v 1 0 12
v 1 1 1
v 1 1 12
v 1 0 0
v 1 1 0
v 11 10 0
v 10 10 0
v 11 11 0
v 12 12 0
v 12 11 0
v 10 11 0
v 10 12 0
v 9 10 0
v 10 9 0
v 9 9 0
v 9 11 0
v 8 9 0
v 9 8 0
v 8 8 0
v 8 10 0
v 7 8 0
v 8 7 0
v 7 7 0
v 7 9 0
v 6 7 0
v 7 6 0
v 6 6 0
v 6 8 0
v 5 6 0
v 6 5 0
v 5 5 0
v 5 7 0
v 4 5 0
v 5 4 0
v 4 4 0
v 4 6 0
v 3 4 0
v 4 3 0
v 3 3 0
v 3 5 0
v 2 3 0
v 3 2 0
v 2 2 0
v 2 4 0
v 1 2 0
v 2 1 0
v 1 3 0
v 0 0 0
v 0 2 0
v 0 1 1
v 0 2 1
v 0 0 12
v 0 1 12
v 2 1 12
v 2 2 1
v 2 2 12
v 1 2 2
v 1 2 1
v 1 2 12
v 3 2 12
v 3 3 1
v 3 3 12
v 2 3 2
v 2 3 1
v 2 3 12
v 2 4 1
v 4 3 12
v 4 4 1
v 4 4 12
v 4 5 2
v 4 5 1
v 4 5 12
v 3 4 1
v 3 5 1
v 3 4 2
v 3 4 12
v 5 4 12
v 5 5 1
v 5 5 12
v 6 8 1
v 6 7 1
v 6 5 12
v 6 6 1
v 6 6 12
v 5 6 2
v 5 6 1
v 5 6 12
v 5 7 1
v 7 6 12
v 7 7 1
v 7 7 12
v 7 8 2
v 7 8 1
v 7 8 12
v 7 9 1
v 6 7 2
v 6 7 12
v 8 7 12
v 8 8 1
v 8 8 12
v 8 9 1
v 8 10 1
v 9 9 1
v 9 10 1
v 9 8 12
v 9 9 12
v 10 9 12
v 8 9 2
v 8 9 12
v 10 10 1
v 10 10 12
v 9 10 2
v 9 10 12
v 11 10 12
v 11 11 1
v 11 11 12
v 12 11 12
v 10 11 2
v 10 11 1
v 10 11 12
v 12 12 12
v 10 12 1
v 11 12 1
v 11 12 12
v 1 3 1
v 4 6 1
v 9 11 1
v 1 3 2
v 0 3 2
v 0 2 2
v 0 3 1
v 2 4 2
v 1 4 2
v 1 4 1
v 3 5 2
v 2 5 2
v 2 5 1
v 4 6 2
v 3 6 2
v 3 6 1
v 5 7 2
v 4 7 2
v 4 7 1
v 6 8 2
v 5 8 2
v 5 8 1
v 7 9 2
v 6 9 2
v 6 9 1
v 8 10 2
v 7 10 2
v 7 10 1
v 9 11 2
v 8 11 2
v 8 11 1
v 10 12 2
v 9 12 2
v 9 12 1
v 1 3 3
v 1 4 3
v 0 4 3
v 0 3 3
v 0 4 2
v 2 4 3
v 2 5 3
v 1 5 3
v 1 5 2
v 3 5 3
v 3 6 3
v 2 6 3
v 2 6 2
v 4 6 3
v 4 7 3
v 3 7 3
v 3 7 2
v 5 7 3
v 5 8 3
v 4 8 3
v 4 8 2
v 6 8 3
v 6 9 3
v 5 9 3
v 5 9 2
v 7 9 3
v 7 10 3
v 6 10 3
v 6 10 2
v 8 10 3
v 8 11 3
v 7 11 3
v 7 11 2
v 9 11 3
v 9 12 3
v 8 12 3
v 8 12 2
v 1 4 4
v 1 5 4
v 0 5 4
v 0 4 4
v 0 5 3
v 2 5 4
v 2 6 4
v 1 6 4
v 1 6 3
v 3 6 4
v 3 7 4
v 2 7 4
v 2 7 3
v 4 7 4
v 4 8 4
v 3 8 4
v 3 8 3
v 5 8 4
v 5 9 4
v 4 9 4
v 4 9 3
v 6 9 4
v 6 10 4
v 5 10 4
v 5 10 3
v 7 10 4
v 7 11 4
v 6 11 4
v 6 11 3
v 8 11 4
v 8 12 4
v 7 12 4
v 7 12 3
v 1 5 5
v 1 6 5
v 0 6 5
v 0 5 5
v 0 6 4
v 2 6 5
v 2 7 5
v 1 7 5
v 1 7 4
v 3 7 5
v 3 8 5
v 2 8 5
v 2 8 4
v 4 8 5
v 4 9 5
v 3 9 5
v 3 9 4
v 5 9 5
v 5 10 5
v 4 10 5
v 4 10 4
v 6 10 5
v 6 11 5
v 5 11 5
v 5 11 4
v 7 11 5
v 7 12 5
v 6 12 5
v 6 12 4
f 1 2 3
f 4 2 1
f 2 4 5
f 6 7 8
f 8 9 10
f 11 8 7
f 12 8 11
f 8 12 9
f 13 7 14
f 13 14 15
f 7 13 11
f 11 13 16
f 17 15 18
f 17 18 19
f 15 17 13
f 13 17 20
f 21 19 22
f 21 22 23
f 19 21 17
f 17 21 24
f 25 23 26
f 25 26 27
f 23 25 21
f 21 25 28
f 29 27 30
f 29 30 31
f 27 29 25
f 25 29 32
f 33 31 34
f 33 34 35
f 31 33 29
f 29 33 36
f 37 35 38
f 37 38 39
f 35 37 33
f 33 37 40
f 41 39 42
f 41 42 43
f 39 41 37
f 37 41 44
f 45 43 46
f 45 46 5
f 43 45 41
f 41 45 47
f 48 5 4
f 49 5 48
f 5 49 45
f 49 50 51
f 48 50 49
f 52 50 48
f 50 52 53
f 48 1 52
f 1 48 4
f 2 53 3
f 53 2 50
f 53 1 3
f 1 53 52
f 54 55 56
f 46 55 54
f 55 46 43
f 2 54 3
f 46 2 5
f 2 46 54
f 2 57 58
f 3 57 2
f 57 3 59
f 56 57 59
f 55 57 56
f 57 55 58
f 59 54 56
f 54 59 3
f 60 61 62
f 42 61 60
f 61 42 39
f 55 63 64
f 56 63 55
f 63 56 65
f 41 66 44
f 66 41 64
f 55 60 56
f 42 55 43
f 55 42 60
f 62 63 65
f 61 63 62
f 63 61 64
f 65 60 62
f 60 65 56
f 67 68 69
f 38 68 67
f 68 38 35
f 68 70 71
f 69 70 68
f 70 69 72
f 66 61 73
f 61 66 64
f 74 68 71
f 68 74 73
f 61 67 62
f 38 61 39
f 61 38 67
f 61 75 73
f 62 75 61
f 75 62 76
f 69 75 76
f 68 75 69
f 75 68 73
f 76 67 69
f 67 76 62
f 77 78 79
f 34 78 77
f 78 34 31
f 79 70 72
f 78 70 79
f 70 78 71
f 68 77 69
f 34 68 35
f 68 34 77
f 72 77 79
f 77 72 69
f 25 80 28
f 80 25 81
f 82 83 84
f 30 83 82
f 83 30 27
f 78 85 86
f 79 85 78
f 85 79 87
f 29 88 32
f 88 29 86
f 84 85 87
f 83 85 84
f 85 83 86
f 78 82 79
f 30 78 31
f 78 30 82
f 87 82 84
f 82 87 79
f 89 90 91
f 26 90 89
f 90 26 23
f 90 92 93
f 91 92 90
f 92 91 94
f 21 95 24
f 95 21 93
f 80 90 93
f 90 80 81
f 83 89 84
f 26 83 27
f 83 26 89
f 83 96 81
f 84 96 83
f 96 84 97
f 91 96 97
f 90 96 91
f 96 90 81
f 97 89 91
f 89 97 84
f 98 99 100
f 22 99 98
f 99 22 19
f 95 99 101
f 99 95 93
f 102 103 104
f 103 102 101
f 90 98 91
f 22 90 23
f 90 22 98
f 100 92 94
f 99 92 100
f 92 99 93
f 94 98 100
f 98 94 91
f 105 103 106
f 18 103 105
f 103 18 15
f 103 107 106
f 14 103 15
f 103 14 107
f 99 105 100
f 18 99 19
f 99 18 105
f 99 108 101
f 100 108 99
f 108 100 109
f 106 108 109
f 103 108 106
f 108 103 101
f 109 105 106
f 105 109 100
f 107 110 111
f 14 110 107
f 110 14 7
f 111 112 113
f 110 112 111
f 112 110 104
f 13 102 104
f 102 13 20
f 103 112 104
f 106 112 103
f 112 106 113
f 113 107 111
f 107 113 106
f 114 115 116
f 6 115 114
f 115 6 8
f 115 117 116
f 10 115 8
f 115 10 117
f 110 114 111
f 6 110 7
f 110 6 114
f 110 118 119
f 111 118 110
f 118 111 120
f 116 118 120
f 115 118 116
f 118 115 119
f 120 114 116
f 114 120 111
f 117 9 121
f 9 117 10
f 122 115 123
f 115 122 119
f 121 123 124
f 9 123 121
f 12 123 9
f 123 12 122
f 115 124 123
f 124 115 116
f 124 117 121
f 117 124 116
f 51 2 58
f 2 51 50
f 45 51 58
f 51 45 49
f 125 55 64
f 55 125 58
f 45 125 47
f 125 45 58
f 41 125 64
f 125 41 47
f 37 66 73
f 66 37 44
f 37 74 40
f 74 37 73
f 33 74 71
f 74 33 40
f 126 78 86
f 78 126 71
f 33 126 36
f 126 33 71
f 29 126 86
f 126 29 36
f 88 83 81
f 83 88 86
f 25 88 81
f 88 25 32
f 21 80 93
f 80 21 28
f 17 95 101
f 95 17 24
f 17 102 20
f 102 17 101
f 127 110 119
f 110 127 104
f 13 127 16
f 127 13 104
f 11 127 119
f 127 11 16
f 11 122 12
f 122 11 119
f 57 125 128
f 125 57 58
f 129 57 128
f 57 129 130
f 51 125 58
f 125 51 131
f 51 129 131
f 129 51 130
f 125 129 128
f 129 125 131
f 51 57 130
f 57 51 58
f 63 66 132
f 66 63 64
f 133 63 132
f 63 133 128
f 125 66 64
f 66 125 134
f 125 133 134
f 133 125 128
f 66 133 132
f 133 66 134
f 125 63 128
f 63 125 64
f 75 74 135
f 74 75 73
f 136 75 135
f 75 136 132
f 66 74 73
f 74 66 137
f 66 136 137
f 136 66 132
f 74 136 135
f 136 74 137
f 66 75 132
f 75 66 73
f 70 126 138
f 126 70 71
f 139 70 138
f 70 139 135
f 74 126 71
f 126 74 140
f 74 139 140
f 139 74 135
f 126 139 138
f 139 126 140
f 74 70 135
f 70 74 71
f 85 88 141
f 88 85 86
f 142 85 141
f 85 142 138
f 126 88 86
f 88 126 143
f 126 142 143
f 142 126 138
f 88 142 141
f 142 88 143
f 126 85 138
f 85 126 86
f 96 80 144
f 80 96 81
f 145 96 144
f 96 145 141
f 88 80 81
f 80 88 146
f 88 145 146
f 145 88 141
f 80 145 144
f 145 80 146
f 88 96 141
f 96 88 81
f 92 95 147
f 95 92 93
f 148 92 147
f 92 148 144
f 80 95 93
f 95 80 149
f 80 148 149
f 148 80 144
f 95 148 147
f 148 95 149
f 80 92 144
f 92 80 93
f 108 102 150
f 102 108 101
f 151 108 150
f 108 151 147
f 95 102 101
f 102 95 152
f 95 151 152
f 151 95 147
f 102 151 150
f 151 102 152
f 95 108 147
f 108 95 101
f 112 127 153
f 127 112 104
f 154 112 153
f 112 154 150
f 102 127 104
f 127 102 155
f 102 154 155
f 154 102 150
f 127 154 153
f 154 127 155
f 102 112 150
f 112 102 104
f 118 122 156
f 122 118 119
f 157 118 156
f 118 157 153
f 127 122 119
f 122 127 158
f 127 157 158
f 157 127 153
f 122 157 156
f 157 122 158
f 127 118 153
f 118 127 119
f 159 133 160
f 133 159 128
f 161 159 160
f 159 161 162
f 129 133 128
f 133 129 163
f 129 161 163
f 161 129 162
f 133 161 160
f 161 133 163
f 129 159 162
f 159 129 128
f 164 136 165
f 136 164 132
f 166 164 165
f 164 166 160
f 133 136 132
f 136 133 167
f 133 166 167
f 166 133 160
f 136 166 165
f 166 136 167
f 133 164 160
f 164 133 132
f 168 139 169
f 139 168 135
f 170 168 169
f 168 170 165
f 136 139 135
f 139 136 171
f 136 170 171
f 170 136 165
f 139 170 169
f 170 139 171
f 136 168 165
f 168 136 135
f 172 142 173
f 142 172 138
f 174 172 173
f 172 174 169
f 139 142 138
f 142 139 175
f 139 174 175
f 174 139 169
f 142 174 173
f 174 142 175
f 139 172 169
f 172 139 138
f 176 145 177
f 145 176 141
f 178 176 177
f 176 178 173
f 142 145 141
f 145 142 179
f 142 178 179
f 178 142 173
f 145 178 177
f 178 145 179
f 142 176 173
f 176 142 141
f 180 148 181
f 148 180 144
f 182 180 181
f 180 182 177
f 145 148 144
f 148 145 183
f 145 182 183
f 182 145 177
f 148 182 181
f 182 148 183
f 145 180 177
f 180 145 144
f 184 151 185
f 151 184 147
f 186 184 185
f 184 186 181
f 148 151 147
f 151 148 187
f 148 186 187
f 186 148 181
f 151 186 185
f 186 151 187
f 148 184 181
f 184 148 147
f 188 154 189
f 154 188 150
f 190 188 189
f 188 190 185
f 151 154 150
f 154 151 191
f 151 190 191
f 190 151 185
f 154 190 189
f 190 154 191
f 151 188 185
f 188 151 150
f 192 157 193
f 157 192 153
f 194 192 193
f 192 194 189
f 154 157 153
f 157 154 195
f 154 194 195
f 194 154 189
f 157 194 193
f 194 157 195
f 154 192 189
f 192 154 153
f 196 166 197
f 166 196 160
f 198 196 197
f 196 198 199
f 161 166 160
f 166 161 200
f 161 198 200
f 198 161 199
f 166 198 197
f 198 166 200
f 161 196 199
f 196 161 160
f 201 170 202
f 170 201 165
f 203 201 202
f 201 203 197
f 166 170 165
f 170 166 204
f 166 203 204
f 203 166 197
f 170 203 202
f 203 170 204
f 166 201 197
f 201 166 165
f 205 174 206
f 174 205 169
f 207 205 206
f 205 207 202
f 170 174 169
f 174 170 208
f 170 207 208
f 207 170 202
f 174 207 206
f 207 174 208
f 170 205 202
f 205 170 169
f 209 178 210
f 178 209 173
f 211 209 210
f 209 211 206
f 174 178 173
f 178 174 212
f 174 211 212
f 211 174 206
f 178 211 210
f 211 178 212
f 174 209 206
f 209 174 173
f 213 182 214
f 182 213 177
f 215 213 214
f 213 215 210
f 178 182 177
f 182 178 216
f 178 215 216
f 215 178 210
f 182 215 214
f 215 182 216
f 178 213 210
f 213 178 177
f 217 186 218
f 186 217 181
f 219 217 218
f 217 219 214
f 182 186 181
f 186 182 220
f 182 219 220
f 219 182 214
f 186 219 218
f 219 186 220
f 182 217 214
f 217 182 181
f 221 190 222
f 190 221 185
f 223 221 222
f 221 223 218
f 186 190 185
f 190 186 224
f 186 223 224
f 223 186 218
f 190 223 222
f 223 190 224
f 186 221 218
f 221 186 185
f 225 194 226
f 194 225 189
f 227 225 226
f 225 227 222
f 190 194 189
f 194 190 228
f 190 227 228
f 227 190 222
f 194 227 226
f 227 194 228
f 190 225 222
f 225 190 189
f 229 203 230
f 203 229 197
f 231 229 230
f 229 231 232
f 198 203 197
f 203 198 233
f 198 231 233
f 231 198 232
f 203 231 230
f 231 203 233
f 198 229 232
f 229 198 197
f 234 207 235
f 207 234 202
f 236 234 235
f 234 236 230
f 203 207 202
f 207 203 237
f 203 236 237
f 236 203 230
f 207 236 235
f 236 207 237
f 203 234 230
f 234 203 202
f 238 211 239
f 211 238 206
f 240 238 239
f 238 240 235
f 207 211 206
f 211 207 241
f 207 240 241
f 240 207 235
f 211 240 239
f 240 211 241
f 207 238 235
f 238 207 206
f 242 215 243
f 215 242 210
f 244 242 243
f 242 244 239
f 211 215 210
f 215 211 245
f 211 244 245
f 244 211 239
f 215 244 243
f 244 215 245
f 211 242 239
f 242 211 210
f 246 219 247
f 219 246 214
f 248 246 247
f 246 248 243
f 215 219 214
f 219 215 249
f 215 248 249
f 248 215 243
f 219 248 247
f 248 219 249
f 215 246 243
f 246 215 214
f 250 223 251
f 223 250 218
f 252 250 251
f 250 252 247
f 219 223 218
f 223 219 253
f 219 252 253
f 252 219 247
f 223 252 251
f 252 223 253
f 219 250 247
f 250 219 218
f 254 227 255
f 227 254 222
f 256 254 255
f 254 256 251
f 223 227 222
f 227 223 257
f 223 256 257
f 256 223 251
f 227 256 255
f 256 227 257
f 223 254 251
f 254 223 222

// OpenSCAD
union() {
    translate([0, 0, 0]) cube([1, 1, 1]);
    translate([0, 0, 1]) cube([1, 1, 1]);
    translate([0, 0, 2]) cube([1, 1, 1]);
    translate([0, 0, 3]) cube([1, 1, 1]);
    translate([0, 0, 4]) cube([1, 1, 1]);
    translate([0, 0, 5]) cube([1, 1, 1]);
    translate([0, 0, 6]) cube([1, 1, 1]);
    translate([0, 0, 7]) cube([1, 1, 1]);
    translate([0, 0, 8]) cube([1, 1, 1]);
    translate([0, 0, 9]) cube([1, 1, 1]);
    translate([0, 0, 10]) cube([1, 1, 1]);
    translate([0, 0, 11]) cube([1, 1, 1]);
    translate([1, 1, 0]) cube([1, 1, 1]);
    translate([1, 1, 1]) cube([1, 1, 1]);
    translate([1, 1, 2]) cube([1, 1, 1]);
    translate([1, 1, 3]) cube([1, 1, 1]);
    translate([1, 1, 4]) cube([1, 1, 1]);
    translate([1, 1, 5]) cube([1, 1, 1]);
    translate([1, 1, 6]) cube([1, 1, 1]);
    translate([1, 1, 7]) cube([1, 1, 1]);
    translate([1, 1, 8]) cube([1, 1, 1]);
    translate([1, 1, 9]) cube([1, 1, 1]);
    translate([1, 1, 10]) cube([1, 1, 1]);
    translate([1, 1, 11]) cube([1, 1, 1]);
    translate([2, 2, 0]) cube([1, 1, 1]);
    translate([2, 2, 1]) cube([1, 1, 1]);
    translate([2, 2, 2]) cube([1, 1, 1]);
    translate([2, 2, 3]) cube([1, 1, 1]);
    translate([2, 2, 4]) cube([1, 1, 1]);
    translate([2, 2, 5]) cube([1, 1, 1]);
    translate([2, 2, 6]) cube([1, 1, 1]);
    translate([2, 2, 7]) cube([1, 1, 1]);
    translate([2, 2, 8]) cube([1, 1, 1]);
    translate([2, 2, 9]) cube([1, 1, 1]);
    translate([2, 2, 10]) cube([1, 1, 1]);
    translate([2, 2, 11]) cube([1, 1, 1]);
    translate([3, 3, 0]) cube([1, 1, 1]);
    translate([3, 3, 1]) cube([1, 1, 1]);
    translate([3, 3, 2]) cube([1, 1, 1]);
    translate([3, 3, 3]) cube([1, 1, 1]);
    translate([3, 3, 4]) cube([1, 1, 1]);
    translate([3, 3, 5]) cube([1, 1, 1]);
    translate([3, 3, 6]) cube([1, 1, 1]);
    translate([3, 3, 7]) cube([1, 1, 1]);
    translate([3, 3, 8]) cube([1, 1, 1]);
    translate([3, 3, 9]) cube([1, 1, 1]);
    translate([3, 3, 10]) cube([1, 1, 1]);
    translate([3, 3, 11]) cube([1, 1, 1]);
    translate([4, 4, 0]) cube([1, 1, 1]);
    translate([4, 4, 1]) cube([1, 1, 1]);
    translate([4, 4, 2]) cube([1, 1, 1]);
    translate([4, 4, 3]) cube([1, 1, 1]);
    translate([4, 4, 4]) cube([1, 1, 1]);
    translate([4, 4, 5]) cube([1, 1, 1]);
    translate([4, 4, 6]) cube([1, 1, 1]);
    translate([4, 4, 7]) cube([1, 1, 1]);
    translate([4, 4, 8]) cube([1, 1, 1]);
    translate([4, 4, 9]) cube([1, 1, 1]);
    translate([4, 4, 10]) cube([1, 1, 1]);
    translate([4, 4, 11]) cube([1, 1, 1]);
    translate([5, 5, 0]) cube([1, 1, 1]);
    translate([5, 5, 1]) cube([1, 1, 1]);
    translate([5, 5, 2]) cube([1, 1, 1]);
    translate([5, 5, 3]) cube([1, 1, 1]);
    translate([5, 5, 4]) cube([1, 1, 1]);
    translate([5, 5, 5]) cube([1, 1, 1]);
    translate([5, 5, 6]) cube([1, 1, 1]);
    translate([5, 5, 7]) cube([1, 1, 1]);
    translate([5, 5, 8]) cube([1, 1, 1]);
    translate([5, 5, 9]) cube([1, 1, 1]);
    translate([5, 5, 10]) cube([1, 1, 1]);
    translate([5, 5, 11]) cube([1, 1, 1]);
    translate([6, 6, 0]) cube([1, 1, 1]);
    translate([6, 6, 1]) cube([1, 1, 1]);
    translate([6, 6, 2]) cube([1, 1, 1]);
    translate([6, 6, 3]) cube([1, 1, 1]);
    translate([6, 6, 4]) cube([1, 1, 1]);
    translate([6, 6, 5]) cube([1, 1, 1]);
    translate([6, 6, 6]) cube([1, 1, 1]);
    translate([6, 6, 7]) cube([1, 1, 1]);
    translate([6, 6, 8]) cube([1, 1, 1]);
    translate([6, 6, 9]) cube([1, 1, 1]);
    translate([6, 6, 10]) cube([1, 1, 1]);
    translate([6, 6, 11]) cube([1, 1, 1]);
    translate([7, 7, 0]) cube([1, 1, 1]);
    translate([7, 7, 1]) cube([1, 1, 1]);
    translate([7, 7, 2]) cube([1, 1, 1]);
    translate([7, 7, 3]) cube([1, 1, 1]);
    translate([7, 7, 4]) cube([1, 1, 1]);
    translate([7, 7, 5]) cube([1, 1, 1]);
    translate([7, 7, 6]) cube([1, 1, 1]);
    translate([7, 7, 7]) cube([1, 1, 1]);
    translate([7, 7, 8]) cube([1, 1, 1]);
    translate([7, 7, 9]) cube([1, 1, 1]);
    translate([7, 7, 10]) cube([1, 1, 1]);
    translate([7, 7, 11]) cube([1, 1, 1]);
    translate([8, 8, 0]) cube([1, 1, 1]);
    translate([8, 8, 1]) cube([1, 1, 1]);
    translate([8, 8, 2]) cube([1, 1, 1]);
    translate([8, 8, 3]) cube([1, 1, 1]);
    translate([8, 8, 4]) cube([1, 1, 1]);
    translate([8, 8, 5]) cube([1, 1, 1]);
    translate([8, 8, 6]) cube([1, 1, 1]);
    translate([8, 8, 7]) cube([1, 1, 1]);
    translate([8, 8, 8]) cube([1, 1, 1]);
    translate([8, 8, 9]) cube([1, 1, 1]);
    translate([8, 8, 10]) cube([1, 1, 1]);
    translate([8, 8, 11]) cube([1, 1, 1]);
    translate([9, 9, 0]) cube([1, 1, 1]);
    translate([9, 9, 1]) cube([1, 1, 1]);
    translate([9, 9, 2]) cube([1, 1, 1]);
    translate([9, 9, 3]) cube([1, 1, 1]);
    translate([9, 9, 4]) cube([1, 1, 1]);
    translate([9, 9, 5]) cube([1, 1, 1]);
    translate([9, 9, 6]) cube([1, 1, 1]);
    translate([9, 9, 7]) cube([1, 1, 1]);
    translate([9, 9, 8]) cube([1, 1, 1]);
    translate([9, 9, 9]) cube([1, 1, 1]);
    translate([9, 9, 10]) cube([1, 1, 1]);
    translate([9, 9, 11]) cube([1, 1, 1]);
    translate([10, 10, 0]) cube([1, 1, 1]);
    translate([10, 10, 1]) cube([1, 1, 1]);
    translate([10, 10, 2]) cube([1, 1, 1]);
    translate([10, 10, 3]) cube([1, 1, 1]);
    translate([10, 10, 4]) cube([1, 1, 1]);
    translate([10, 10, 5]) cube([1, 1, 1]);
    translate([10, 10, 6]) cube([1, 1, 1]);
    translate([10, 10, 7]) cube([1, 1, 1]);
    translate([10, 10, 8]) cube([1, 1, 1]);
    translate([10, 10, 9]) cube([1, 1, 1]);
    translate([10, 10, 10]) cube([1, 1, 1]);
    translate([10, 10, 11]) cube([1, 1, 1]);
    translate([11, 11, 0]) cube([1, 1, 1]);
    translate([11, 11, 1]) cube([1, 1, 1]);
    translate([11, 11, 2]) cube([1, 1, 1]);
    translate([11, 11, 3]) cube([1, 1, 1]);
    translate([11, 11, 4]) cube([1, 1, 1]);
    translate([11, 11, 5]) cube([1, 1, 1]);
    translate([11, 11, 6]) cube([1, 1, 1]);
    translate([11, 11, 7]) cube([1, 1, 1]);
    translate([11, 11, 8]) cube([1, 1, 1]);
    translate([11, 11, 9]) cube([1, 1, 1]);
    translate([11, 11, 10]) cube([1, 1, 1]);
    translate([11, 11, 11]) cube([1, 1, 1]);
    translate([0, 1, 0]) cube([1, 1, 1]);
    translate([1, 2, 0]) cube([1, 1, 1]);
    translate([2, 3, 0]) cube([1, 1, 1]);
    translate([3, 4, 0]) cube([1, 1, 1]);
    translate([4, 5, 0]) cube([1, 1, 1]);
    translate([5, 6, 0]) cube([1, 1, 1]);
    translate([6, 7, 0]) cube([1, 1, 1]);
    translate([7, 8, 0]) cube([1, 1, 1]);
    translate([8, 9, 0]) cube([1, 1, 1]);
    translate([9, 10, 0]) cube([1, 1, 1]);
    translate([10, 11, 0]) cube([1, 1, 1]);
    translate([0, 2, 1]) cube([1, 1, 1]);
    translate([1, 3, 1]) cube([1, 1, 1]);
    translate([2, 4, 1]) cube([1, 1, 1]);
    translate([3, 5, 1]) cube([1, 1, 1]);
    translate([4, 6, 1]) cube([1, 1, 1]);
    translate([5, 7, 1]) cube([1, 1, 1]);
    translate([6, 8, 1]) cube([1, 1, 1]);
    translate([7, 9, 1]) cube([1, 1, 1]);
    translate([8, 10, 1]) cube([1, 1, 1]);
    translate([9, 11, 1]) cube([1, 1, 1]);
    translate([0, 3, 2]) cube([1, 1, 1]);
    translate([1, 4, 2]) cube([1, 1, 1]);
    translate([2, 5, 2]) cube([1, 1, 1]);
    translate([3, 6, 2]) cube([1, 1, 1]);
    translate([4, 7, 2]) cube([1, 1, 1]);
    translate([5, 8, 2]) cube([1, 1, 1]);
    translate([6, 9, 2]) cube([1, 1, 1]);
    translate([7, 10, 2]) cube([1, 1, 1]);
    translate([8, 11, 2]) cube([1, 1, 1]);
    translate([0, 4, 3]) cube([1, 1, 1]);
    translate([1, 5, 3]) cube([1, 1, 1]);
    translate([2, 6, 3]) cube([1, 1, 1]);
    translate([3, 7, 3]) cube([1, 1, 1]);
    translate([4, 8, 3]) cube([1, 1, 1]);
    translate([5, 9, 3]) cube([1, 1, 1]);
    translate([6, 10, 3]) cube([1, 1, 1]);
    translate([7, 11, 3]) cube([1, 1, 1]);
    translate([0, 5, 4]) cube([1, 1, 1]);
    translate([1, 6, 4]) cube([1, 1, 1]);
    translate([2, 7, 4]) cube([1, 1, 1]);
    translate([3, 8, 4]) cube([1, 1, 1]);
    translate([4, 9, 4]) cube([1, 1, 1]);
    translate([5, 10, 4]) cube([1, 1, 1]);
    translate([6, 11, 4]) cube([1, 1, 1]);
}
